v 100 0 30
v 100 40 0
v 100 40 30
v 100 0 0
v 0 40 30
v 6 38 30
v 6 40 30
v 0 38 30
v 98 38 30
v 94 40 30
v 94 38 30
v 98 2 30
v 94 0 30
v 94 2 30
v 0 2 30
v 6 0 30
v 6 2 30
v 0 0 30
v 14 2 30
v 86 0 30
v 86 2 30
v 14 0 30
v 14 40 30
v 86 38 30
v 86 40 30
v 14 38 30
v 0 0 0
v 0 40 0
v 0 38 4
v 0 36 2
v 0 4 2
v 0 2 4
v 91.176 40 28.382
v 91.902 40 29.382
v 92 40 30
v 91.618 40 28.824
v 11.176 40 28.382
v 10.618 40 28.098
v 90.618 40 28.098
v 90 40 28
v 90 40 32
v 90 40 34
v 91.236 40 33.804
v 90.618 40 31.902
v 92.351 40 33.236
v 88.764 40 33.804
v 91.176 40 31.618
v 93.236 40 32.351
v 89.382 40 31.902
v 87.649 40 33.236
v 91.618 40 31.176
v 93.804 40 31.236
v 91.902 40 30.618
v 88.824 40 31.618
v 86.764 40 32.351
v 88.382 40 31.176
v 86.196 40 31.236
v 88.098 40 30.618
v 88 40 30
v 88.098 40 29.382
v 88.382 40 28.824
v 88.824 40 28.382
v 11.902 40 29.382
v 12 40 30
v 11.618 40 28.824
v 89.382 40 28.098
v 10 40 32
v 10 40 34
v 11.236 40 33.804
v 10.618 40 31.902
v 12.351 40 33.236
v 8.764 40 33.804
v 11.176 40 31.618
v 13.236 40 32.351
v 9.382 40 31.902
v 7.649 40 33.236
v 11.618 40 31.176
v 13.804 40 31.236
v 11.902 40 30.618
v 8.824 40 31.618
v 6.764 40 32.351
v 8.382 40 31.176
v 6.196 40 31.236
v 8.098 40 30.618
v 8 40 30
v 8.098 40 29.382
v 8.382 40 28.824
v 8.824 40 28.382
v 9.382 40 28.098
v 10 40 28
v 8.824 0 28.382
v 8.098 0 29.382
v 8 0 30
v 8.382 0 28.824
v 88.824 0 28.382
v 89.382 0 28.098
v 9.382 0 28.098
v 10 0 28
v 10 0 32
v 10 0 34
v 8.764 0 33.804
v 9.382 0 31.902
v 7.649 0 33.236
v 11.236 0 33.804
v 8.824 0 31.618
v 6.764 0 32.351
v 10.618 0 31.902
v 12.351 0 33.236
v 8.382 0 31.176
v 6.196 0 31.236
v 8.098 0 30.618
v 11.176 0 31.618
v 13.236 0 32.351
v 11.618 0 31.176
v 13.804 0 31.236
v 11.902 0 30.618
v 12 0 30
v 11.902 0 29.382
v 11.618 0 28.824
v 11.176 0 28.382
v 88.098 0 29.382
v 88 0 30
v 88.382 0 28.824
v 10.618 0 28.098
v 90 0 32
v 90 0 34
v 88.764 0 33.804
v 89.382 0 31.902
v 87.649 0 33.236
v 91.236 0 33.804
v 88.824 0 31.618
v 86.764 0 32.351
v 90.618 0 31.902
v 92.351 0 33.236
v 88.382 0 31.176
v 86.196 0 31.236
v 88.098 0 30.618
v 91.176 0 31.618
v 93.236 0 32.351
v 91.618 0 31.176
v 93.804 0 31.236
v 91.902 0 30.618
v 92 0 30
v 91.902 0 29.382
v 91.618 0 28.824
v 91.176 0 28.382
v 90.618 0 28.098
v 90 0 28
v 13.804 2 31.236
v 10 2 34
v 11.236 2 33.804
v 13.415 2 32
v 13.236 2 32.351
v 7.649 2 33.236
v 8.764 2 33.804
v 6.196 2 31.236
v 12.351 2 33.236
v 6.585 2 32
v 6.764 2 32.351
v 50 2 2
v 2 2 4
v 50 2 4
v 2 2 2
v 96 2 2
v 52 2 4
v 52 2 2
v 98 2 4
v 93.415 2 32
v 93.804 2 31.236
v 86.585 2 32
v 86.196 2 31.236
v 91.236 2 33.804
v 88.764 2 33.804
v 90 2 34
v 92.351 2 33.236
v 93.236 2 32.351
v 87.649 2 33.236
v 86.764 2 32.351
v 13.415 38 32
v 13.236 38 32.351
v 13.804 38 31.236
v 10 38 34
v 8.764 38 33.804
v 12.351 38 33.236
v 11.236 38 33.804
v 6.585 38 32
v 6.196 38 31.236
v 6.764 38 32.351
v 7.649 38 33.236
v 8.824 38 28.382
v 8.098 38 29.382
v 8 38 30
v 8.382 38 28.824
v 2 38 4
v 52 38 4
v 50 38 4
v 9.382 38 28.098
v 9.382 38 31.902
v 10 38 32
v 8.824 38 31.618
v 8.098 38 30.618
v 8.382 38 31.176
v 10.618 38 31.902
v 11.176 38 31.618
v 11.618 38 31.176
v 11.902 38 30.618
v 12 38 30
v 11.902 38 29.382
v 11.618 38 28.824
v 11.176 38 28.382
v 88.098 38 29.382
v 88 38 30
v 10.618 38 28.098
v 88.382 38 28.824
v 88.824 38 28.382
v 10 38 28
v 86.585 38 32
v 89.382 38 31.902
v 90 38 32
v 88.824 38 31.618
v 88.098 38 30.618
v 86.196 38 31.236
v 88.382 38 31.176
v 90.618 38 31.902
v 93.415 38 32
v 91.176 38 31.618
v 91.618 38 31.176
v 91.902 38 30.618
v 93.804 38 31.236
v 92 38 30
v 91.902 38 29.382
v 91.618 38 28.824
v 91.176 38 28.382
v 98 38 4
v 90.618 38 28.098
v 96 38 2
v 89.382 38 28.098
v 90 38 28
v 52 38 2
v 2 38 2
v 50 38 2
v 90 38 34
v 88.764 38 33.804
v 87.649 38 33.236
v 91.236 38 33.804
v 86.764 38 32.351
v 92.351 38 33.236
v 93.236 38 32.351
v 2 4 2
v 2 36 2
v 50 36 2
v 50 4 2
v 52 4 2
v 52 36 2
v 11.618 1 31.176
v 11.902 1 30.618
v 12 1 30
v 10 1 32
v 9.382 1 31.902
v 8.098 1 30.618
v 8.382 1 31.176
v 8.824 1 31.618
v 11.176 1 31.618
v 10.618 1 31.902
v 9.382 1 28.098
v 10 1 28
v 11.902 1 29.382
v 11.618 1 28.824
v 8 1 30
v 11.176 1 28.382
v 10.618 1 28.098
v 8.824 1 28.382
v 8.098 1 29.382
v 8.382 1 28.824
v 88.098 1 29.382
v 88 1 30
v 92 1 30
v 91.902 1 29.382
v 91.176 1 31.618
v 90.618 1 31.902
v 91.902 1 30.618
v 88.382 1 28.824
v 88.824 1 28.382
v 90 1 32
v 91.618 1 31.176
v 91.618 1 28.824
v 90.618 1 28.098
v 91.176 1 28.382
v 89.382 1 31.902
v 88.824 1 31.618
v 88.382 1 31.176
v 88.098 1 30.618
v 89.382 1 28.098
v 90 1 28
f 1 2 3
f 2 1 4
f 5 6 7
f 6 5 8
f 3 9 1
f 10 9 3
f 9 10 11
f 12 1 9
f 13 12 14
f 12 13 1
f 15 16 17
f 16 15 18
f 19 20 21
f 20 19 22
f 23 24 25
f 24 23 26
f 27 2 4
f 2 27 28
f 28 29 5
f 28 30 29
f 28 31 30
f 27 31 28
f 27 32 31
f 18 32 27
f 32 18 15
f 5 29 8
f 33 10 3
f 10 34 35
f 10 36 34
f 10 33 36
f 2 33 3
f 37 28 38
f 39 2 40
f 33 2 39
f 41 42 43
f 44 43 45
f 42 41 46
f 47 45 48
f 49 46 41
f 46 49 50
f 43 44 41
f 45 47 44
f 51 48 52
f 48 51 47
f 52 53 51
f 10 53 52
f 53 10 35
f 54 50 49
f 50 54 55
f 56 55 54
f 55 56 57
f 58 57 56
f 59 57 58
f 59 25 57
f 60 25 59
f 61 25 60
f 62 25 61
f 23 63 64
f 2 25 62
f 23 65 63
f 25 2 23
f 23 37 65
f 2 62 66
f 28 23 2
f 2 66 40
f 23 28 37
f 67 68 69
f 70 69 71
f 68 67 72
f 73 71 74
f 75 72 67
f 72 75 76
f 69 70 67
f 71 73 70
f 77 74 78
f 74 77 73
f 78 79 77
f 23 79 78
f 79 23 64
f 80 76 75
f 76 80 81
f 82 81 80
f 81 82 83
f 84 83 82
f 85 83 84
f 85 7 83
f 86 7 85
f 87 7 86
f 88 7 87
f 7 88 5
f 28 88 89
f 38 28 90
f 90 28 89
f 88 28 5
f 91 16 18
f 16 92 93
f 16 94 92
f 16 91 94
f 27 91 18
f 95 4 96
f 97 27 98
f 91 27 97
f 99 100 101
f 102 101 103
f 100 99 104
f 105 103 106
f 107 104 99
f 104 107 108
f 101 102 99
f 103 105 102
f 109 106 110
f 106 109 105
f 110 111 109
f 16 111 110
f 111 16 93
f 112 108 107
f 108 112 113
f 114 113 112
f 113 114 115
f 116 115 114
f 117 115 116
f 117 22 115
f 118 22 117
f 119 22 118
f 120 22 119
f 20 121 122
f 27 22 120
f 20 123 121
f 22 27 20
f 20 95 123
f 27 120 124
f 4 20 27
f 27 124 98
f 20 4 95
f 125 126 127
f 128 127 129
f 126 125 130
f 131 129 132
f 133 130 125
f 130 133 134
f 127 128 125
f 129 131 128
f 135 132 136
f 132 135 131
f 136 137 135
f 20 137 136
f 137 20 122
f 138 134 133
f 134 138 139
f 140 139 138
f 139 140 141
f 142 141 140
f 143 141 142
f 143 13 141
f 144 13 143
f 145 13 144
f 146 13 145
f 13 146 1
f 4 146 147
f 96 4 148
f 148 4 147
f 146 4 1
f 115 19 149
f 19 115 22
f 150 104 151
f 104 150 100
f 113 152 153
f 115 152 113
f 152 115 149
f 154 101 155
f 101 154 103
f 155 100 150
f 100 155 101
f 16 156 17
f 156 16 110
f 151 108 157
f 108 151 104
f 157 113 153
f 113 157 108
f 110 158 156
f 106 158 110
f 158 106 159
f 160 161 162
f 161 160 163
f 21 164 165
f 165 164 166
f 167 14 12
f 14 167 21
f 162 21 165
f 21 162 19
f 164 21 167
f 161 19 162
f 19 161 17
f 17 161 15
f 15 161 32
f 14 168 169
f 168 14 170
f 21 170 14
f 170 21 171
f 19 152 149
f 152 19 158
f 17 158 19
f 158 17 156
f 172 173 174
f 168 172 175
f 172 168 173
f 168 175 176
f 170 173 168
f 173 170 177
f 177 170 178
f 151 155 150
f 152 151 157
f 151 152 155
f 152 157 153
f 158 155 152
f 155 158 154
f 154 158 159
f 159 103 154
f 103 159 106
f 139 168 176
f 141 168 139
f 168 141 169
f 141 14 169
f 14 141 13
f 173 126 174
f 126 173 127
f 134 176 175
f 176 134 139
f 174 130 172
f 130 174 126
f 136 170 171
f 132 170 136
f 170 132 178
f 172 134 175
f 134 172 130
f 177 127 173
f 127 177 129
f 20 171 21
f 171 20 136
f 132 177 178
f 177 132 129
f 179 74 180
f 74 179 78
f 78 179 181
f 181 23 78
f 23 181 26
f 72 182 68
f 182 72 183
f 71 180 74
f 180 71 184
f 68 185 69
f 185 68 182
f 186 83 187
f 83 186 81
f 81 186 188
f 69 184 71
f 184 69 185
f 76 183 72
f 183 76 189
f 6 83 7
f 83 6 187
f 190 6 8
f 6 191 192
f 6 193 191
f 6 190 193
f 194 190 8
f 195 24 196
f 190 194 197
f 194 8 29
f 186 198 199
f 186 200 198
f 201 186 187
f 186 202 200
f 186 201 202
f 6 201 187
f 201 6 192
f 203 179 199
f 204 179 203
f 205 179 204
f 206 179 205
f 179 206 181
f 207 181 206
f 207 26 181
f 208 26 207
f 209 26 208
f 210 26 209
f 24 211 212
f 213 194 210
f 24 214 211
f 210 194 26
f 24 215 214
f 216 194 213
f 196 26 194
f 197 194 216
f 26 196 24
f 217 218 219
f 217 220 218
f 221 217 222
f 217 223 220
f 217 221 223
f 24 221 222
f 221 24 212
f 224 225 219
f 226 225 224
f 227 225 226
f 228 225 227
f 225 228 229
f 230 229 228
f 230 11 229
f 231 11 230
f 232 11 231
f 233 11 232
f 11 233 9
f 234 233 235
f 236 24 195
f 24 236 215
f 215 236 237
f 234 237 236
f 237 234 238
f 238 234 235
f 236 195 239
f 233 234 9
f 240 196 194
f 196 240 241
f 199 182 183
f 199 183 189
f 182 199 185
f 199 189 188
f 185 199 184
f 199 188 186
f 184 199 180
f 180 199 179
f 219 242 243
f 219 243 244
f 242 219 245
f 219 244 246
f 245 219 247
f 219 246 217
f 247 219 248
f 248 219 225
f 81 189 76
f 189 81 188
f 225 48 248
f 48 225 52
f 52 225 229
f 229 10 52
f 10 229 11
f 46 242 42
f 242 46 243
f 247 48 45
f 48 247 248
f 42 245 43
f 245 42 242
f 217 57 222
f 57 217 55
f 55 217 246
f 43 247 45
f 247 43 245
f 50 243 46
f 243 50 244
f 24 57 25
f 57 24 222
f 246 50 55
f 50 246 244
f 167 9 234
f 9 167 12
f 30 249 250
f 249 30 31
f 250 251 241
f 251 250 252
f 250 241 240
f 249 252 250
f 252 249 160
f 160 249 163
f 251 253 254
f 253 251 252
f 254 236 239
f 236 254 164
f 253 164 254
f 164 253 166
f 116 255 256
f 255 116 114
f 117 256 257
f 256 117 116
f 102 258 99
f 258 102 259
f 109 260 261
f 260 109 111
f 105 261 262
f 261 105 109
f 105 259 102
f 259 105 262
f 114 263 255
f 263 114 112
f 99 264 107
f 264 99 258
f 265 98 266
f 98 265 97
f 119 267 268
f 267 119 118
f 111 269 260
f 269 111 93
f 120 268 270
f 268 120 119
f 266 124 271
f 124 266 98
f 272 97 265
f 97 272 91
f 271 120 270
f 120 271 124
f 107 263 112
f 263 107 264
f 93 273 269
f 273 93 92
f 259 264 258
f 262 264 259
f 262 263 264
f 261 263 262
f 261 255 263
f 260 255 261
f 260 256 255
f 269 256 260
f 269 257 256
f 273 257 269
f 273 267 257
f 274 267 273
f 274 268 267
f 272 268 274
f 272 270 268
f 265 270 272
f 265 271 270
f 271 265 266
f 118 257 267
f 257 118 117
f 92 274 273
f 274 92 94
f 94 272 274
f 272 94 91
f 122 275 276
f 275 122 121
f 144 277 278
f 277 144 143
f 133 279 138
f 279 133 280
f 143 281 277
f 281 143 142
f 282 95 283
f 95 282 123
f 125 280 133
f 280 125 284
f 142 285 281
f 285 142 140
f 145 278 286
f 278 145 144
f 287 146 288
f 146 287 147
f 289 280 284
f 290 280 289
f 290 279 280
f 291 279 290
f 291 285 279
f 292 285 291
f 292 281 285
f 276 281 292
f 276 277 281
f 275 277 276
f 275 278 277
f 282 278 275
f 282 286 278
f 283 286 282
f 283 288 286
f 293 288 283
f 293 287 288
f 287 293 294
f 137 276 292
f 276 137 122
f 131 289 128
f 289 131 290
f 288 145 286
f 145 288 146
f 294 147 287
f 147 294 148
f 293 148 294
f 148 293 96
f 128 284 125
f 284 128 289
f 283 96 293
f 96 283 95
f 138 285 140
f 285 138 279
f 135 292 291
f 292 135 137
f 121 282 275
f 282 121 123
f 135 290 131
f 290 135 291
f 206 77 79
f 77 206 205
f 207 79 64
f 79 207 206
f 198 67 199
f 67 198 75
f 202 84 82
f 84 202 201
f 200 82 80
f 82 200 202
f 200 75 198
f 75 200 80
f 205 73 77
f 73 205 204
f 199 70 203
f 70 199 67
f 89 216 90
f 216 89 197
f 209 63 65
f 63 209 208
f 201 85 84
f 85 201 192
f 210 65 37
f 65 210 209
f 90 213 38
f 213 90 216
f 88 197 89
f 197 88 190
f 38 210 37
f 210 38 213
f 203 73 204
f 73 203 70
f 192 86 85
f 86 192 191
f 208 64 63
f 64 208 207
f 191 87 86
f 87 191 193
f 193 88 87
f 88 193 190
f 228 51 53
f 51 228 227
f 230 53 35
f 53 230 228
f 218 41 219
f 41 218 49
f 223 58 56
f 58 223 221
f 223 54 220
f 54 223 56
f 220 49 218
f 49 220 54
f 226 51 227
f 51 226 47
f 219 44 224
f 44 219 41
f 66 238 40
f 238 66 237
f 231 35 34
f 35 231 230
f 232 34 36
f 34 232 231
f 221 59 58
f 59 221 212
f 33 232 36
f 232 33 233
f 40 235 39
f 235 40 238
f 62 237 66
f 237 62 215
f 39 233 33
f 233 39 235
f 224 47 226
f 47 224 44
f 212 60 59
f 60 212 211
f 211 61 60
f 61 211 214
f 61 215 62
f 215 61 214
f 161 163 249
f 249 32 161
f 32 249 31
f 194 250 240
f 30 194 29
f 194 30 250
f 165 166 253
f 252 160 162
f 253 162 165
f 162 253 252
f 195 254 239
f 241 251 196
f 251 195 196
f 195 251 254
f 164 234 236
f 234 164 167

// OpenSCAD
$fn=20;
module oje(x,y,z){
    translate([x,y,z]){
        rotate([90,0,0])
            cylinder(d = 8, h= 2);
    }
}
module hul(x,y,z){
    translate([x,y,z]){
        rotate([90,0,0])
            cylinder(d = 4, h= 4);
    }

}
difference(){
    union(){
        cube([100,40,30]);
        oje(10,2,30);
        oje(90,2,30);
        oje(10,40,30);
        oje(90,40,30);
    }
    translate([-2,2,2]) 
        cube([100,36,30]);
    hul(10,1,30);
    hul(90,1,30);
    hul(10,41,30);
    hul(90,41,30);
}
module trekantl(){
    difference(){
        cube([2,2,2]);
        translate([0,0,0])
            rotate([45,0,0])
                cube([3.5,3,3]);
    }
}

module trekantr(){
    difference(){
        cube([2,2,2]);
        translate([0,2,0])
            rotate([45,0,0])
                cube([3.5,3,3]);
    }
}

module trekantb(){
    difference(){
        cube([2,36,2]);
        translate([0,0,0])
            rotate([0,-45,0])
                cube([3.5,38,3]);
    }
}


translate([0,2,2]) 
    trekantr();
translate([0,36,2]) 
    trekantl();
translate([50,2,2]) 
    trekantr();
translate([50,36,2]) 
    trekantl();
translate([96,2,2])
    trekantb();
